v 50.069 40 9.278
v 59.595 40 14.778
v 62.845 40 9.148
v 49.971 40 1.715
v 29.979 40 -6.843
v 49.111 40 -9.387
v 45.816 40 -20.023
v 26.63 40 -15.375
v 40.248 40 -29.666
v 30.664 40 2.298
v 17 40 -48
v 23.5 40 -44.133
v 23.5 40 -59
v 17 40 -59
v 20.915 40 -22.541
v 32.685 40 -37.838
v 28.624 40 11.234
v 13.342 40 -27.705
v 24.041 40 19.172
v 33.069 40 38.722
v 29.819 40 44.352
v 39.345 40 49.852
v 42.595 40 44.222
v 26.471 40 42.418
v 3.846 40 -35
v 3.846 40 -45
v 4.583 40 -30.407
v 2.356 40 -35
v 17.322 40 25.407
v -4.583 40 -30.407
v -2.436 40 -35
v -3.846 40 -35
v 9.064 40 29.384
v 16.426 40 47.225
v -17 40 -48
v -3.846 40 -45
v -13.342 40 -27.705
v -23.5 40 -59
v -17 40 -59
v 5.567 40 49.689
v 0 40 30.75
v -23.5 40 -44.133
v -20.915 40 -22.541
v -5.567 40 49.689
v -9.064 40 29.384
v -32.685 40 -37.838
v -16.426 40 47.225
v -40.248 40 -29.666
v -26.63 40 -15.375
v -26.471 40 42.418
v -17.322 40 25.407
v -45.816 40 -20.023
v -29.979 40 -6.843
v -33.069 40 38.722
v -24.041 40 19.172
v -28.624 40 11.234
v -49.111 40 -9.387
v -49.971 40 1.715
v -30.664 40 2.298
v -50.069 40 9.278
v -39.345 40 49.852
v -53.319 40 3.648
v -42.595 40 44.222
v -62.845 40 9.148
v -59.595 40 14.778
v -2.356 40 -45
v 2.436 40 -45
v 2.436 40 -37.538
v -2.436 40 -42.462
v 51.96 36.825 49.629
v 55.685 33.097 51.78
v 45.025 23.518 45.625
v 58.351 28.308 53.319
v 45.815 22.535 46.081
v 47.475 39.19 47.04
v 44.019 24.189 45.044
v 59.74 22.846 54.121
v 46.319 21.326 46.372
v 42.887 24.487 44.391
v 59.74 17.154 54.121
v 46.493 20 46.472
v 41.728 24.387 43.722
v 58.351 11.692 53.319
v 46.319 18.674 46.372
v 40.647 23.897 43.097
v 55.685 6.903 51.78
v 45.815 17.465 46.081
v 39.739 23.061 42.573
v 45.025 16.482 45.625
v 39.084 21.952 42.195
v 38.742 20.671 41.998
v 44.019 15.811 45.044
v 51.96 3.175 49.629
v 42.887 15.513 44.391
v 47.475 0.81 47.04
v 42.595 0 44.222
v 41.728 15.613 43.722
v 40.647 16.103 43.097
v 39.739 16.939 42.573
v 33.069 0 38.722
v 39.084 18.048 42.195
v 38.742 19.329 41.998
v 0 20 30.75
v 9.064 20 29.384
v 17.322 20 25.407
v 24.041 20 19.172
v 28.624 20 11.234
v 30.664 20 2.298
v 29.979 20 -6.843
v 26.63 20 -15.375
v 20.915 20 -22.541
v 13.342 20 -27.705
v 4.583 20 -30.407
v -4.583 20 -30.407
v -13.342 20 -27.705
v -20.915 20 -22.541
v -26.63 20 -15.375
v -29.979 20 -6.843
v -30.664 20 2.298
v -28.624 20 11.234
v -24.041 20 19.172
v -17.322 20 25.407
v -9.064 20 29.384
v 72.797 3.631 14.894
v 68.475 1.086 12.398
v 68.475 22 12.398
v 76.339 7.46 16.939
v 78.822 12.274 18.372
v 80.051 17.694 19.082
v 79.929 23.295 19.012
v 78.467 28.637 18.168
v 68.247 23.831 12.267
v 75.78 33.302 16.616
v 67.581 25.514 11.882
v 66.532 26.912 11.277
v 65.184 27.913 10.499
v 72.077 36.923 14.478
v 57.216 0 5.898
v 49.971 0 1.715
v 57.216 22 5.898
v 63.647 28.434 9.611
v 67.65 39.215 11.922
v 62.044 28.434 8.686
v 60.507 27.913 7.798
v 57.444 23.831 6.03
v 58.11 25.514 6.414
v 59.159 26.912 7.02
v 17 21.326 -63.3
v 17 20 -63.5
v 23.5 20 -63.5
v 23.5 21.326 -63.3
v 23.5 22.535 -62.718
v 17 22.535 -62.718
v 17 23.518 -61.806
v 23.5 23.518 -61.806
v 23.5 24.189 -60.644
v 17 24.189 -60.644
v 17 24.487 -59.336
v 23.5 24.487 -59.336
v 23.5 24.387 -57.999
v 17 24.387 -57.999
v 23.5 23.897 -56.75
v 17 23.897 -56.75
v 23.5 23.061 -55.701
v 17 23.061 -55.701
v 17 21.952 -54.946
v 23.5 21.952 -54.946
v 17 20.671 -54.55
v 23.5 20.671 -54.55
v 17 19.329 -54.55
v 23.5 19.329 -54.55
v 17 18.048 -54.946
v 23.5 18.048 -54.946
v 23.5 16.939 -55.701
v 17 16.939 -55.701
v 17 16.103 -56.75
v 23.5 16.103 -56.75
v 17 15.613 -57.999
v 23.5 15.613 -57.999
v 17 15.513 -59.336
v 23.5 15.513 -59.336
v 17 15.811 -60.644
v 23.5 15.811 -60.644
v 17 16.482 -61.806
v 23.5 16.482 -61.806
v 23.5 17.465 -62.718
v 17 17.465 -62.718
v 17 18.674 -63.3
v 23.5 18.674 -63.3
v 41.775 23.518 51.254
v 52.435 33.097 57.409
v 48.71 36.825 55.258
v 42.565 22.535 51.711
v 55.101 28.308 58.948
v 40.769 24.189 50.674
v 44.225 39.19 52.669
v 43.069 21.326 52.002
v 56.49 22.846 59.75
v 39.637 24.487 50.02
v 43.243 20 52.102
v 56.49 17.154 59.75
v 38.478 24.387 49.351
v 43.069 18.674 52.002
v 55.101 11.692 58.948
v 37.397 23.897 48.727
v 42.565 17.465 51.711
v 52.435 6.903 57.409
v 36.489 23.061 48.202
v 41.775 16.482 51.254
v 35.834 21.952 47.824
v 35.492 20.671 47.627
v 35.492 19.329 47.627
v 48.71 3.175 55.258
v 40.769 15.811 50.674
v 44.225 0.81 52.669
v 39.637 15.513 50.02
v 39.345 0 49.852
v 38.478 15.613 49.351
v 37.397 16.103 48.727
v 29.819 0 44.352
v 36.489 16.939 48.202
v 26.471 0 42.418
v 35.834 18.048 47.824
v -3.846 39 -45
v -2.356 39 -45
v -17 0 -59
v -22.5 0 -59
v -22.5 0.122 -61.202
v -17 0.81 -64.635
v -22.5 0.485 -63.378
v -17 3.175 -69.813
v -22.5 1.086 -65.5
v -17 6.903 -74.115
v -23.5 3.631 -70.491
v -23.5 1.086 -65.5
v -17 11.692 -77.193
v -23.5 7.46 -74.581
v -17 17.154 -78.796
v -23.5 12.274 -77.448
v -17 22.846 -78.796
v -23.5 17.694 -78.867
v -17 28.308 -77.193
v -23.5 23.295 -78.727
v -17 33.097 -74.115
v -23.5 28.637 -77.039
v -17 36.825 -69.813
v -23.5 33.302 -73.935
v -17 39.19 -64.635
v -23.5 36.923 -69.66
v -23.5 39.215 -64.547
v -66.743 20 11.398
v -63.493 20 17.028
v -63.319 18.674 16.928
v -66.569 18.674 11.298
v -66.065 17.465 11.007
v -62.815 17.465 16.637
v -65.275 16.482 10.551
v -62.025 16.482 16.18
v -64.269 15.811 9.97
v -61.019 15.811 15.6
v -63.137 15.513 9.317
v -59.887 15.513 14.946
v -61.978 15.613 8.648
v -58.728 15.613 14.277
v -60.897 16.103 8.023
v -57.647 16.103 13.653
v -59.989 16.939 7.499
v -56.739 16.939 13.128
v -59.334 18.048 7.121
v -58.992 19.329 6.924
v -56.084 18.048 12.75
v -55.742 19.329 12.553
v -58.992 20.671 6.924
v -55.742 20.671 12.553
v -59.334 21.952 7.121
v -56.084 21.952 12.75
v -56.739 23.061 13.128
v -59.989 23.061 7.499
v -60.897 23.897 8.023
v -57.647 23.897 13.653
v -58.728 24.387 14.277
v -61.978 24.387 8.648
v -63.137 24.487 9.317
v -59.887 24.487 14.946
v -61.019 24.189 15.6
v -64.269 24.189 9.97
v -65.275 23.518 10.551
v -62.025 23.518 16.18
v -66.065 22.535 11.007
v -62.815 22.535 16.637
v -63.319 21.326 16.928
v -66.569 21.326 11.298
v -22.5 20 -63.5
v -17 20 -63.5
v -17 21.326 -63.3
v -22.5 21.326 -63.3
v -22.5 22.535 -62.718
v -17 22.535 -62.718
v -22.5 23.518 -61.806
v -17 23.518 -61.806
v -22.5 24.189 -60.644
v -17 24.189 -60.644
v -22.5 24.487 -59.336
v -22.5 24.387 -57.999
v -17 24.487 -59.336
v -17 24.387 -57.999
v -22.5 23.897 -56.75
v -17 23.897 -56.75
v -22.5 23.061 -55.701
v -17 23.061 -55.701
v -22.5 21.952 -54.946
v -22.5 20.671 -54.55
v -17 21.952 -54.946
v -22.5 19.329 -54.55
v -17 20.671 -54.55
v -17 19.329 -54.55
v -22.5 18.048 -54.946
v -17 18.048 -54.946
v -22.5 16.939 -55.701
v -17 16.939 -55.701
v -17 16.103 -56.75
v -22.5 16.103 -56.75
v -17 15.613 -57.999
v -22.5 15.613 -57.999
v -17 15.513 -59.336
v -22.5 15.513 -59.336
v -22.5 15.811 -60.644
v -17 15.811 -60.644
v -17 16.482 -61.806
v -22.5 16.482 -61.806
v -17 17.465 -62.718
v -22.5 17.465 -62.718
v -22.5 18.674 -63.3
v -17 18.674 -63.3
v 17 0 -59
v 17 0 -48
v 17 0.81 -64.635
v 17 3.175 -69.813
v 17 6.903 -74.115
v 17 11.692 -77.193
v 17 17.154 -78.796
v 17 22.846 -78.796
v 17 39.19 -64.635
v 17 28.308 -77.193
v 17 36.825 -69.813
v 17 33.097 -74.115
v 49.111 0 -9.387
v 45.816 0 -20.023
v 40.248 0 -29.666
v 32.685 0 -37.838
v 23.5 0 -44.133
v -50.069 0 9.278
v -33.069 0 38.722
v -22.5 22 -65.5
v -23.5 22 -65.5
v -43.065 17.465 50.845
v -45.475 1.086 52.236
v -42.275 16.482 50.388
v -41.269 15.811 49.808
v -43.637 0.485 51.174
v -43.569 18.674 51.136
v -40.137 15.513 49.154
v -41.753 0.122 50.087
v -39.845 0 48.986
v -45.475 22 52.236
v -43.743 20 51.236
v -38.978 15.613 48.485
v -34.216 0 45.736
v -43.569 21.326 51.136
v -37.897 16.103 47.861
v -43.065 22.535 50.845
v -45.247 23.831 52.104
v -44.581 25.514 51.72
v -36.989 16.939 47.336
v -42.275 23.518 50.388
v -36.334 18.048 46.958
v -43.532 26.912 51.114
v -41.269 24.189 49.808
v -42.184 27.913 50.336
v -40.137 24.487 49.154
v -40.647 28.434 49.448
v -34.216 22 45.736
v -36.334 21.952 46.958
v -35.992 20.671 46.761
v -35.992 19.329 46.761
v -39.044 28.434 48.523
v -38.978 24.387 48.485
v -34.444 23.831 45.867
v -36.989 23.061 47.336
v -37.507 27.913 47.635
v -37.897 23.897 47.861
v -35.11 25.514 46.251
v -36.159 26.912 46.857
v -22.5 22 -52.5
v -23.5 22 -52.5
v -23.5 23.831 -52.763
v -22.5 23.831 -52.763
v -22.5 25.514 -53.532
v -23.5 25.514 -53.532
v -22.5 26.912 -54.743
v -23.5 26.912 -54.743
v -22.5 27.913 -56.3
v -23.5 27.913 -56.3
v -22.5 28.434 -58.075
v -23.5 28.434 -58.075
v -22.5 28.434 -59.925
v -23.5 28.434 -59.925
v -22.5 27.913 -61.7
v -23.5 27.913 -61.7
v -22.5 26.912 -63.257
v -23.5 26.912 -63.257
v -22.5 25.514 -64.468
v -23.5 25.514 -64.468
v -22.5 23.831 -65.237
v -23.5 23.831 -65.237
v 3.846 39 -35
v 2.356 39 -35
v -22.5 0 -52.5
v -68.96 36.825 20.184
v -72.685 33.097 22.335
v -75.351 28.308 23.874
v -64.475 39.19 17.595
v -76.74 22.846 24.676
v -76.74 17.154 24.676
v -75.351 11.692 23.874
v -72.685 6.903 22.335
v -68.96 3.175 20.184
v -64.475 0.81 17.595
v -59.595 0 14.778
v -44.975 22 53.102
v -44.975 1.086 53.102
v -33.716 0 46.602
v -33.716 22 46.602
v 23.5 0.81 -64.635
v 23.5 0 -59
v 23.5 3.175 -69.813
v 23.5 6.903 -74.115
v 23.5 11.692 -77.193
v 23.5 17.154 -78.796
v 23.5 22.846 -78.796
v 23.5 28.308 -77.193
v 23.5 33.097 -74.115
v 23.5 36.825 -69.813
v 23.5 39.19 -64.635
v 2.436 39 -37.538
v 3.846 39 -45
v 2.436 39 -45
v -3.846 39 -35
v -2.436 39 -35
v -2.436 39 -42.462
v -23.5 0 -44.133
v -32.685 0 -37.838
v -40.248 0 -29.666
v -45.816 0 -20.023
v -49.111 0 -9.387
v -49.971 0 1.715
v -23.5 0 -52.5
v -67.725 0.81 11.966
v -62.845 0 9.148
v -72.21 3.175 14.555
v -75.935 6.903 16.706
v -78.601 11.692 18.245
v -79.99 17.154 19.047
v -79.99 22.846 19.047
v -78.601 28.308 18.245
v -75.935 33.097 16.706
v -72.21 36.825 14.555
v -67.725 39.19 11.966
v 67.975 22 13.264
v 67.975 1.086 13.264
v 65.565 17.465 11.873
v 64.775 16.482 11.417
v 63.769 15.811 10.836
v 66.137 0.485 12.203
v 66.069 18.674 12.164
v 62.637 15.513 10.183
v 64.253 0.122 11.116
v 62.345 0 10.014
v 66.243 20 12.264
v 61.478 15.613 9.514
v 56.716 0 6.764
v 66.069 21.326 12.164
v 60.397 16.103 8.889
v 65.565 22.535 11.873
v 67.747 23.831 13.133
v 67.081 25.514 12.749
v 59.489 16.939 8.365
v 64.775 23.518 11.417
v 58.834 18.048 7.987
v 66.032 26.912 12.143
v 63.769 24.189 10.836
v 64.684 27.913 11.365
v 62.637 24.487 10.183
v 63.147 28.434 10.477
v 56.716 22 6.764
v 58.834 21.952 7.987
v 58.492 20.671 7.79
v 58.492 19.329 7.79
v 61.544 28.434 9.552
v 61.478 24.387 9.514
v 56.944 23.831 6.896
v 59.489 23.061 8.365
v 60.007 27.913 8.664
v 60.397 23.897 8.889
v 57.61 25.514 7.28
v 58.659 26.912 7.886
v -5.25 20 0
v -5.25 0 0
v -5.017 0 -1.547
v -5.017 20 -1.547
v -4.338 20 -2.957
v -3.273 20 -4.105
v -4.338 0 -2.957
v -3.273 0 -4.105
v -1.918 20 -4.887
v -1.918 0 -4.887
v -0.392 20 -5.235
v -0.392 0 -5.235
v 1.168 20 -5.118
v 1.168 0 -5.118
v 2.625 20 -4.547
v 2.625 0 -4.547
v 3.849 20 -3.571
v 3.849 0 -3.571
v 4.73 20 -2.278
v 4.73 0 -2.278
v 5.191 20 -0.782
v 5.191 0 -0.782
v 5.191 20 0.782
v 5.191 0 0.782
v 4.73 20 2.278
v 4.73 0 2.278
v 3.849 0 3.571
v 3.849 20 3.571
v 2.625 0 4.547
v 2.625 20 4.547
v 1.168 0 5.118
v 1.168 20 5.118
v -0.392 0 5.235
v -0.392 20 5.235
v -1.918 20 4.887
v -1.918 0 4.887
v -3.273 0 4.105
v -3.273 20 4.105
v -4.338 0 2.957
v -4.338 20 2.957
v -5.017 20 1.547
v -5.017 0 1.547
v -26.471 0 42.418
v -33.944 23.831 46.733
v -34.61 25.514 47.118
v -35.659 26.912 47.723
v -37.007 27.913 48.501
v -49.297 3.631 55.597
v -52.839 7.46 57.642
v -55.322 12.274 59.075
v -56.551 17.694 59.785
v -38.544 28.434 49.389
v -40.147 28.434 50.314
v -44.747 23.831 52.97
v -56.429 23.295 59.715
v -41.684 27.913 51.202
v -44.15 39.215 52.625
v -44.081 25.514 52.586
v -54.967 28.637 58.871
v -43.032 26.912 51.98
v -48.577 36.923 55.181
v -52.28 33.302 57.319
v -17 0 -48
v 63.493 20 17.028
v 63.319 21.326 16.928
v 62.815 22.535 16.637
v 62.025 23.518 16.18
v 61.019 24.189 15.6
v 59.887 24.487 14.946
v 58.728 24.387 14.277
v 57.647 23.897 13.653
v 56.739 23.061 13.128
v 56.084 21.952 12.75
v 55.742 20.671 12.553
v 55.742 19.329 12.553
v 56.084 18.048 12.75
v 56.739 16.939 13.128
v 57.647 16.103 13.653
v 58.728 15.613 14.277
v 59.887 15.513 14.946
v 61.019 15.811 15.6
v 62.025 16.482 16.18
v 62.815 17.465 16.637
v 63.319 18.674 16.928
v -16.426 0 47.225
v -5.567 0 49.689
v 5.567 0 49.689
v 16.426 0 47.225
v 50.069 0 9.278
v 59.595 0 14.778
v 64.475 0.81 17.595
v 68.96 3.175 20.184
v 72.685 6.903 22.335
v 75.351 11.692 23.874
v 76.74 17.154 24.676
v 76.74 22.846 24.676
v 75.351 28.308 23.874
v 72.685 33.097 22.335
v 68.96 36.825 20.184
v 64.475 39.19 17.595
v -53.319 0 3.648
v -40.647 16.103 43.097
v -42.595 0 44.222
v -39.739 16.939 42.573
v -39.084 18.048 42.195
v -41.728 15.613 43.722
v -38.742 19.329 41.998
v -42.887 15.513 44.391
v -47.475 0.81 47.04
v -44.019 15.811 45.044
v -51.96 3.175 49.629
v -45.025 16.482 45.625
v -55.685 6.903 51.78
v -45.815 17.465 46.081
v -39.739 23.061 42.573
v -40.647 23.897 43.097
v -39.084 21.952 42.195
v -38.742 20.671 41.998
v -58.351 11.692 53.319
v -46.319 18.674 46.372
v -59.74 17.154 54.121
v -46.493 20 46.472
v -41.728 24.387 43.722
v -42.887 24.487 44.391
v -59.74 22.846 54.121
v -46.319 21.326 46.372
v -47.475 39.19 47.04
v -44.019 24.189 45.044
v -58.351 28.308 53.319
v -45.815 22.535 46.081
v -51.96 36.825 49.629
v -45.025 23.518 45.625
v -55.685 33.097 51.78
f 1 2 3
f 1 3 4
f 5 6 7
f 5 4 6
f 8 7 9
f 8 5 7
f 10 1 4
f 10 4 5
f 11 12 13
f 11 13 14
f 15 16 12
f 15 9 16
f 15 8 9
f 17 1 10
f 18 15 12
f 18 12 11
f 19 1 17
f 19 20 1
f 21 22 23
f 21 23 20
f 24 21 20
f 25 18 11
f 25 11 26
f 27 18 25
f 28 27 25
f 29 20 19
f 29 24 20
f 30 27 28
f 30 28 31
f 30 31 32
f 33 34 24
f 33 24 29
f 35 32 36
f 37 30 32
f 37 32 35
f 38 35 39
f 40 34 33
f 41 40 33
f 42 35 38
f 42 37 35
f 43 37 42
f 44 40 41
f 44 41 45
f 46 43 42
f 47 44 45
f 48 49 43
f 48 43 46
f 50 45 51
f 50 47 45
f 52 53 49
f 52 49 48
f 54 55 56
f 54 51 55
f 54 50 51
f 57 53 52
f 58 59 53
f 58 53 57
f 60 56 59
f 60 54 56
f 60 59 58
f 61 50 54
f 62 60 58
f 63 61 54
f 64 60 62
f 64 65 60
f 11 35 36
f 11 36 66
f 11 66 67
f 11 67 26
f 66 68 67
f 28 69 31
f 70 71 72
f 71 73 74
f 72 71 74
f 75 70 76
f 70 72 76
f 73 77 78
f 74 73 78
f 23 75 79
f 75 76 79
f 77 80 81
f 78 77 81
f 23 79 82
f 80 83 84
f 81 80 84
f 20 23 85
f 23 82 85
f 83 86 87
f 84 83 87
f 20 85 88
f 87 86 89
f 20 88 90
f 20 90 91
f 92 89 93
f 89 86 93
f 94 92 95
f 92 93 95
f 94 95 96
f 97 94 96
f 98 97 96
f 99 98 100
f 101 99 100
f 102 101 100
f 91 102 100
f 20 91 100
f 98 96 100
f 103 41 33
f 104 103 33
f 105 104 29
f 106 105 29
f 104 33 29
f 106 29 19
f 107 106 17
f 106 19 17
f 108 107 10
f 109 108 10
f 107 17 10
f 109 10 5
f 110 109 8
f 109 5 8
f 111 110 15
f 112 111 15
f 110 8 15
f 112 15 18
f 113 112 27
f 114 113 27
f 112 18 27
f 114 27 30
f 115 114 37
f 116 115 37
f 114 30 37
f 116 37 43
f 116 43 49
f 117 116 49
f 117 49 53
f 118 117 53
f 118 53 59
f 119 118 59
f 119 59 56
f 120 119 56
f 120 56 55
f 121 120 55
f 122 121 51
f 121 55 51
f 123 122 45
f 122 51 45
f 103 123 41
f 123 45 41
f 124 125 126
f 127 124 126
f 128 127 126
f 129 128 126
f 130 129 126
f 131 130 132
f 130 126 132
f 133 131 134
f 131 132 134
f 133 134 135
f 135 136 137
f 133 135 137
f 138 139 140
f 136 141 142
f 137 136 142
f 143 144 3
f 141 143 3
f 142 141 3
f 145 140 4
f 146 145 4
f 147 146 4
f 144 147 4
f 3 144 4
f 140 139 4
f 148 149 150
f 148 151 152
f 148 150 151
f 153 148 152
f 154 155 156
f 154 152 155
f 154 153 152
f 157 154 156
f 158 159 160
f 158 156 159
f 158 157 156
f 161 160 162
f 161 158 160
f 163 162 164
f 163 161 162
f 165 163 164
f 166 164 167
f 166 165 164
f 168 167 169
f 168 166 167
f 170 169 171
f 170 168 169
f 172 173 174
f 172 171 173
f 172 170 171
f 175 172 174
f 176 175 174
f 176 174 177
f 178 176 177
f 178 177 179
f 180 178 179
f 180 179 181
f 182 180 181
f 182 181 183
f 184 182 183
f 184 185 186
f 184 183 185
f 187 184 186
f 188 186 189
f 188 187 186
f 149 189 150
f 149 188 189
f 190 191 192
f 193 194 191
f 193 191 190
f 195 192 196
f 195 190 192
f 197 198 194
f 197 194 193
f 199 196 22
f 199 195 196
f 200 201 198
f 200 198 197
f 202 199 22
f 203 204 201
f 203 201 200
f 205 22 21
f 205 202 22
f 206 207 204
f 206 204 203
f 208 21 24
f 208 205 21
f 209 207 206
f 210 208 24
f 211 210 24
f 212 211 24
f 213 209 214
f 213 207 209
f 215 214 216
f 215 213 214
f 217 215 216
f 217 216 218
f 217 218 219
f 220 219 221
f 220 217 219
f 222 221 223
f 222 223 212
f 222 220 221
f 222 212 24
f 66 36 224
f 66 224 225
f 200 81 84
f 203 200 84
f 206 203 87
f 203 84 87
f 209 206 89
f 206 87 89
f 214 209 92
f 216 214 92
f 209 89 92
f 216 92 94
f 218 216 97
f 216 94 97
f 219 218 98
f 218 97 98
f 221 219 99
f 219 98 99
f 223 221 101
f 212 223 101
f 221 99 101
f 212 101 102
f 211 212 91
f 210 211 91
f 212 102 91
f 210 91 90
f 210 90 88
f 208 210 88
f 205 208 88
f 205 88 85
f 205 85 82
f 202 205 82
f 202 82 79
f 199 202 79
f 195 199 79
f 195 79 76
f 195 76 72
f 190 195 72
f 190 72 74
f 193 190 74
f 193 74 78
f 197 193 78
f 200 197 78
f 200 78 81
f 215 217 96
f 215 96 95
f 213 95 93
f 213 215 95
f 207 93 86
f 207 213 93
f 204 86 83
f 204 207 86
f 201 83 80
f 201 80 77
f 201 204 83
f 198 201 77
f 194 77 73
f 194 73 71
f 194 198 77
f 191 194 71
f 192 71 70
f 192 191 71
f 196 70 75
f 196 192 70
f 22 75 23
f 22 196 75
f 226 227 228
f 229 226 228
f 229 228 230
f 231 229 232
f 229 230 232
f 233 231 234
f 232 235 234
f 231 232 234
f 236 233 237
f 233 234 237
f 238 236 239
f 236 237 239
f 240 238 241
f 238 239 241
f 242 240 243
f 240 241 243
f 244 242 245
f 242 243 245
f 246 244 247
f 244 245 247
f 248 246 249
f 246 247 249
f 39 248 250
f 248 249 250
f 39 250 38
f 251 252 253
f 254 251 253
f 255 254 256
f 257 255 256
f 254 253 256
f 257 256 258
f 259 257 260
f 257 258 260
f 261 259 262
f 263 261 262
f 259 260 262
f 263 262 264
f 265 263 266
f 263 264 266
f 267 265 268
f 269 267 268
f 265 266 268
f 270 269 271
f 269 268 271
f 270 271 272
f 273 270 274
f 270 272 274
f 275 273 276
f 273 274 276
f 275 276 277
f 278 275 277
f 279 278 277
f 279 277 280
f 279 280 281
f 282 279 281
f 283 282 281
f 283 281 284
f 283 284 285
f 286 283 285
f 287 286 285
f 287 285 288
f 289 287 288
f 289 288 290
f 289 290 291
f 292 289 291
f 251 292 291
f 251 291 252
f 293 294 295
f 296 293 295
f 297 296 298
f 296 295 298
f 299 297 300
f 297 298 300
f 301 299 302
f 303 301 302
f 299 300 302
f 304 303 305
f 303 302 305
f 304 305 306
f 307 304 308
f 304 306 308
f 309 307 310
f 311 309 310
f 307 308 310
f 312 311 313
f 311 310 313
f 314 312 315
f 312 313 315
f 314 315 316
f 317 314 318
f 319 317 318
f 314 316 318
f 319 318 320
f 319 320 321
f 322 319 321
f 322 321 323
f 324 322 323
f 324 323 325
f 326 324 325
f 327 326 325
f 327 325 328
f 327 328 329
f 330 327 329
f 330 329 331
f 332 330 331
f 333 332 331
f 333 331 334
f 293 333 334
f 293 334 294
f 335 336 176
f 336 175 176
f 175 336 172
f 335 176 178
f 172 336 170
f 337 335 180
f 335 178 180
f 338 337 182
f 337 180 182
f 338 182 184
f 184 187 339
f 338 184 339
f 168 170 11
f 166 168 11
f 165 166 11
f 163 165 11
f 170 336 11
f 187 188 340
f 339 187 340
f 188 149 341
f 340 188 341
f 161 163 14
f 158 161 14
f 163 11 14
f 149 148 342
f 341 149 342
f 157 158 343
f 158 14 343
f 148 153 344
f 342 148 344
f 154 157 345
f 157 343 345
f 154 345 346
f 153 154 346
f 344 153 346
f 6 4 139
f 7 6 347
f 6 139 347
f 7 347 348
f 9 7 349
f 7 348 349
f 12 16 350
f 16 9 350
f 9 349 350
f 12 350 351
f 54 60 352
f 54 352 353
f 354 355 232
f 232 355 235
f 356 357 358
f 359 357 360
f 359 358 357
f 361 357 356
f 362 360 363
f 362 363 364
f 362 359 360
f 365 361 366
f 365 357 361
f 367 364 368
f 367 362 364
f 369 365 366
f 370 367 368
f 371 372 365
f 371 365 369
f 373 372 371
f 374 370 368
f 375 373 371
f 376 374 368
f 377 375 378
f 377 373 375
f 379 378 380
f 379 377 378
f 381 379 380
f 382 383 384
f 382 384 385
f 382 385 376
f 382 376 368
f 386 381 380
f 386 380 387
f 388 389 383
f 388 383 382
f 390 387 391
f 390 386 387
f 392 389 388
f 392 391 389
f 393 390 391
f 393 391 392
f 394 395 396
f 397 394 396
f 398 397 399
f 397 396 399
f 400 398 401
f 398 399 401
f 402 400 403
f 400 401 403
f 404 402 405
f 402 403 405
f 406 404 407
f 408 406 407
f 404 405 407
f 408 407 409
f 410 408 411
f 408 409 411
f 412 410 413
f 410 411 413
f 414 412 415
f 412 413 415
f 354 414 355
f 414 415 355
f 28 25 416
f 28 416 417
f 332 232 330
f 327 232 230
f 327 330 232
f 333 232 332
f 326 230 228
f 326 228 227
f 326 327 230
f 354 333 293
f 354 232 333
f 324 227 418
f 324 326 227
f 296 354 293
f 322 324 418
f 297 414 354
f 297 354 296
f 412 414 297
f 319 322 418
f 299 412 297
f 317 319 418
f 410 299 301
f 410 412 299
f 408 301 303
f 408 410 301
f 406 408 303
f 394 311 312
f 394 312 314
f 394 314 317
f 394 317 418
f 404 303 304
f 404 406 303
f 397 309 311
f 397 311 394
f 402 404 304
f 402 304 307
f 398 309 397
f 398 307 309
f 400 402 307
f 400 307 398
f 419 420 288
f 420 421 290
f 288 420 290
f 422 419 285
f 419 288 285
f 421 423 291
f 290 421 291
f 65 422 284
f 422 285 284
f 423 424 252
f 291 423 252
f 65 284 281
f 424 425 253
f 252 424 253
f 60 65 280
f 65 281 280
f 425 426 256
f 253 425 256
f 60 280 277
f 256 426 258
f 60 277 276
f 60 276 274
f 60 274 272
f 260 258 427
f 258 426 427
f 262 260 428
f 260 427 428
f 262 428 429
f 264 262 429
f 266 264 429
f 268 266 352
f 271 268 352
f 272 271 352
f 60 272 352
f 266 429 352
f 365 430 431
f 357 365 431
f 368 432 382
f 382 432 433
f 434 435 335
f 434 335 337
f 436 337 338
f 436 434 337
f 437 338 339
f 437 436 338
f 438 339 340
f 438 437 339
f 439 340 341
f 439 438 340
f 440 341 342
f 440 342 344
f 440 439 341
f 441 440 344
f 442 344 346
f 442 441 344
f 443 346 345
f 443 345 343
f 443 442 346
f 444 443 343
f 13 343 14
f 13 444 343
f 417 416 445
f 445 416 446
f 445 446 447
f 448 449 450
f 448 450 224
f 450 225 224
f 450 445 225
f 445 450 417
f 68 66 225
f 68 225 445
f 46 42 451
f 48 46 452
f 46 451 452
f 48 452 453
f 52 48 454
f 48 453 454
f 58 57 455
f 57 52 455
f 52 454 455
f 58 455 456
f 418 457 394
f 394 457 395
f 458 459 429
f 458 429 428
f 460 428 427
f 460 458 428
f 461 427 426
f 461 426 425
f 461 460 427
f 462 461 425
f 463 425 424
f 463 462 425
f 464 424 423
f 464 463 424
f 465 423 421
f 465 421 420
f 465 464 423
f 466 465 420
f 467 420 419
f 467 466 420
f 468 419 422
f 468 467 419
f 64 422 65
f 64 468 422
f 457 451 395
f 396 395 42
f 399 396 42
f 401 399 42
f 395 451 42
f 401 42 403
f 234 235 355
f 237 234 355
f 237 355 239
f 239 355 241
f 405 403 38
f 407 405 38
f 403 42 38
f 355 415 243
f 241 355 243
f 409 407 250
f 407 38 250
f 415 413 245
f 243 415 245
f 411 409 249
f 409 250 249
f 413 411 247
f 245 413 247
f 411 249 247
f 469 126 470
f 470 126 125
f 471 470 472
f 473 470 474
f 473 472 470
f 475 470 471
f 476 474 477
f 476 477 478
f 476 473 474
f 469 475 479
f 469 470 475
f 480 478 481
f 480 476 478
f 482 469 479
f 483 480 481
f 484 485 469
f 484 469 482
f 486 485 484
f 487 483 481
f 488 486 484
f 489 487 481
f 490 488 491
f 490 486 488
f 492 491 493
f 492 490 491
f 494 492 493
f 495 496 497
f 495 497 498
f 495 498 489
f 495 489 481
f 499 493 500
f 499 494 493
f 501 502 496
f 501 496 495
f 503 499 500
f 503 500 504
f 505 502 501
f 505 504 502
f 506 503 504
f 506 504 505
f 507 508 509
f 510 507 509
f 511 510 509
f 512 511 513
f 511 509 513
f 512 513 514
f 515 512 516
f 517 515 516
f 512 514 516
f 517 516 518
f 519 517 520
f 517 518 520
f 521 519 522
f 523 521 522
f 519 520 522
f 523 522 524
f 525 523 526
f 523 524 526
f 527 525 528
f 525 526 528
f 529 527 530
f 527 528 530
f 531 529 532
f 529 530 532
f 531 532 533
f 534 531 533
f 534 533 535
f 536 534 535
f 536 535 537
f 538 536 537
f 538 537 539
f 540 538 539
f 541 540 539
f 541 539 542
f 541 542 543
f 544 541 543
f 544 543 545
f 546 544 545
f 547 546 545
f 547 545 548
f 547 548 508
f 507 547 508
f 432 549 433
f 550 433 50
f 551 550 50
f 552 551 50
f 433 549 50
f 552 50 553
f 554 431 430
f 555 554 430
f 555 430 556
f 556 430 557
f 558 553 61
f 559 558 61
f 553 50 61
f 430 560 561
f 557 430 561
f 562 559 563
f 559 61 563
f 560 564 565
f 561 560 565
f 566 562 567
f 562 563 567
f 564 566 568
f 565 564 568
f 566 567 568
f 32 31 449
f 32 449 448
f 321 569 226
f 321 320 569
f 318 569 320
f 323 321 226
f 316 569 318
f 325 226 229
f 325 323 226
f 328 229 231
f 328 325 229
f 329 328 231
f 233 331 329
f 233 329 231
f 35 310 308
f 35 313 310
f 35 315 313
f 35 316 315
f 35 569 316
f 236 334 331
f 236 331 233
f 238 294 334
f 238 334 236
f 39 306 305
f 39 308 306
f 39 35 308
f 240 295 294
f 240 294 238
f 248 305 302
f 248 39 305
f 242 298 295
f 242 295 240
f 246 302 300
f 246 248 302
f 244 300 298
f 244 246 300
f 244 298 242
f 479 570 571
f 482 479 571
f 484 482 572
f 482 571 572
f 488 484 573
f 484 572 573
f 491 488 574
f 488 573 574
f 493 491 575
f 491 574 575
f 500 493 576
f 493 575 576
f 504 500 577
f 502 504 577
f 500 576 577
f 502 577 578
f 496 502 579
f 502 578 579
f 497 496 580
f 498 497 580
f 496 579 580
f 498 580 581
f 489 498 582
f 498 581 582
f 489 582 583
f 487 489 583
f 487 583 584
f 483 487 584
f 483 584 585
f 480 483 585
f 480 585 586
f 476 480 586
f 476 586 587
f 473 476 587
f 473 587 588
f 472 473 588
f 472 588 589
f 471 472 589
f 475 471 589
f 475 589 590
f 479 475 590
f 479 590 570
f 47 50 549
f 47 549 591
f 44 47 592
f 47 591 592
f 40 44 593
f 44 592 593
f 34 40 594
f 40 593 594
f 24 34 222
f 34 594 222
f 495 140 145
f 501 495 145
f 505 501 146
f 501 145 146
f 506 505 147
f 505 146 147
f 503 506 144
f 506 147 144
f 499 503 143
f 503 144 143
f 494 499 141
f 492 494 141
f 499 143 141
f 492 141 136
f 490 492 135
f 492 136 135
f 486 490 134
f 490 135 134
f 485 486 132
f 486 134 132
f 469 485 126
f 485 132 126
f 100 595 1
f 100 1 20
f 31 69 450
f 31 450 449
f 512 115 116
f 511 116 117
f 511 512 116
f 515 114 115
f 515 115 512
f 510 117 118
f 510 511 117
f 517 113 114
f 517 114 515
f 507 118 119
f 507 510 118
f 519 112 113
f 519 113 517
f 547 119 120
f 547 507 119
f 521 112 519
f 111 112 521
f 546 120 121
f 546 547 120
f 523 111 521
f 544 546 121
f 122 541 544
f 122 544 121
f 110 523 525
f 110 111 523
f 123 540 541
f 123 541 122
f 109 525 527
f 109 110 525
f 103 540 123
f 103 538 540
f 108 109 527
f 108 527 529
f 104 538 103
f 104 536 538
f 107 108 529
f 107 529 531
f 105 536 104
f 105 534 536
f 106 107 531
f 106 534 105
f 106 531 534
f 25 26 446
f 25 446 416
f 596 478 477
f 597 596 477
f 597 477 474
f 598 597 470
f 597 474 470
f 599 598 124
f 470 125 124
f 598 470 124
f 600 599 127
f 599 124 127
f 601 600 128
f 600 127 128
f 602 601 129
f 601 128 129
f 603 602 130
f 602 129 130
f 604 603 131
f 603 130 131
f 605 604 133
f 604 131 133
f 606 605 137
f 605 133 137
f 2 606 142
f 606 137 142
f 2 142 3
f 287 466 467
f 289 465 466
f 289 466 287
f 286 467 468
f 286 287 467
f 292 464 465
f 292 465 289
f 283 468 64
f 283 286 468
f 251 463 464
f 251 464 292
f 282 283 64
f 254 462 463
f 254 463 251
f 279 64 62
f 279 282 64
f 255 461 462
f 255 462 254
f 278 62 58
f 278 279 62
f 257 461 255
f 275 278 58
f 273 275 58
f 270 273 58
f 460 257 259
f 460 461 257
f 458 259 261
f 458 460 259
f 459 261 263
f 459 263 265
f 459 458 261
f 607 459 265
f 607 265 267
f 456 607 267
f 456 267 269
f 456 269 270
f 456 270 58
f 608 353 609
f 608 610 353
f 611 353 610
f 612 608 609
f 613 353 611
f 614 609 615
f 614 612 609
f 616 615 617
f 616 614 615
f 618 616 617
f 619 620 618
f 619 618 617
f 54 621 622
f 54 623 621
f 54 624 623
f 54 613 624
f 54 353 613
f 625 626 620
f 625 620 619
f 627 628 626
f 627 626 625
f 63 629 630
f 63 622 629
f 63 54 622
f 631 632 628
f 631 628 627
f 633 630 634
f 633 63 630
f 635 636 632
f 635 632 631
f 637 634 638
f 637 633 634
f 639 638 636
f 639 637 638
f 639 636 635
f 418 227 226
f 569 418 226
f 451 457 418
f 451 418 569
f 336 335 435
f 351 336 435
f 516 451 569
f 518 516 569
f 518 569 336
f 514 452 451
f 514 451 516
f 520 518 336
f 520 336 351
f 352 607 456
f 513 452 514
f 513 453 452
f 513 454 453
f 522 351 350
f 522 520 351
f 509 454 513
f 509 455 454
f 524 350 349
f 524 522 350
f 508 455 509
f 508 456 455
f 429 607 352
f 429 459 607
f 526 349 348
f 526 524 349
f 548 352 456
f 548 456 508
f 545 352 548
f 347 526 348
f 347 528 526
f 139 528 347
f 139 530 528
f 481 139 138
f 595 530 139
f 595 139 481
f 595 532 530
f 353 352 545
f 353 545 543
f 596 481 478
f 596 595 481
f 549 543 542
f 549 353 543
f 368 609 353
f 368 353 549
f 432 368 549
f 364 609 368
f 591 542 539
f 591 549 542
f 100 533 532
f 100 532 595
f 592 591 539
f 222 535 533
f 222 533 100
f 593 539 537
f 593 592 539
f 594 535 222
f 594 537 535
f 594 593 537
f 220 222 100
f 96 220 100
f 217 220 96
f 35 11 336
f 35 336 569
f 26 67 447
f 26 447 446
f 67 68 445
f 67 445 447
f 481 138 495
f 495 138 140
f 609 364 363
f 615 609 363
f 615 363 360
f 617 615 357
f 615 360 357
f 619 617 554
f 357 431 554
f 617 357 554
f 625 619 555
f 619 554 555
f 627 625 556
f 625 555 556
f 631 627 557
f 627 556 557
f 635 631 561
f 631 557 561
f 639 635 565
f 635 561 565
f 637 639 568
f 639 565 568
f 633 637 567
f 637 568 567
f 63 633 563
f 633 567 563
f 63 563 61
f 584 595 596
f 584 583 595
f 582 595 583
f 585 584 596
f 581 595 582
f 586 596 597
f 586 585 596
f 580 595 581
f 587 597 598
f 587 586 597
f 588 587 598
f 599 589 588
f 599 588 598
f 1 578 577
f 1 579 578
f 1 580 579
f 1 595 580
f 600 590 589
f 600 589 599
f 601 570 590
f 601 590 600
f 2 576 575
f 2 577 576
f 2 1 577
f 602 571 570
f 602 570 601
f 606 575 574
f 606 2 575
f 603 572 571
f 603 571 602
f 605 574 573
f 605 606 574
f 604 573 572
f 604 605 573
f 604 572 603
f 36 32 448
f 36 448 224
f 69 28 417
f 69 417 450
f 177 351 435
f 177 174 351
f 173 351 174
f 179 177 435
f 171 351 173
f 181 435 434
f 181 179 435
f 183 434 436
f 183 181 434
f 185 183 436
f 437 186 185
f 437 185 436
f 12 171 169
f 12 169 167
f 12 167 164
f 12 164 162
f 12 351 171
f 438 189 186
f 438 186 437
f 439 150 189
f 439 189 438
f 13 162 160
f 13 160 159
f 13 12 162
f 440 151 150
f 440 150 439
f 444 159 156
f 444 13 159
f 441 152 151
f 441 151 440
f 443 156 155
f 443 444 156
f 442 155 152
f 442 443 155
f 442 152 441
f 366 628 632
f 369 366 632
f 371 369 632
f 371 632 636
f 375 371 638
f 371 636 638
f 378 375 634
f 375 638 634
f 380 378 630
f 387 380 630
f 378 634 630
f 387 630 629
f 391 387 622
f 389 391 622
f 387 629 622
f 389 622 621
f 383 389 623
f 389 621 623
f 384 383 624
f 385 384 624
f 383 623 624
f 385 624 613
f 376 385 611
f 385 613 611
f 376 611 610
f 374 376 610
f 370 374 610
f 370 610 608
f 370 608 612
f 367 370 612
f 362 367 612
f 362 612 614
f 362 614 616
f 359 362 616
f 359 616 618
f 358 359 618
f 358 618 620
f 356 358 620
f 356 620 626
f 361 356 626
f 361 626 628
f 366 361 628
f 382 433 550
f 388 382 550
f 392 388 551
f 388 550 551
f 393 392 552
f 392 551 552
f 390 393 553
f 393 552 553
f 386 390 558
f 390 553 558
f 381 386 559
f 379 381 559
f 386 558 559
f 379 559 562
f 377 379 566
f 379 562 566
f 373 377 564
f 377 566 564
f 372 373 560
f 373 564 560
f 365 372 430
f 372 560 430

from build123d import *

# Parameters (mm, degrees)
SKETCH1_R                    = 50
BOSS_EXTRUDE1_DEPTH          = 40
SKETCH2_R                    = 30.75
CUT_EXTRUDE1_DEPTH           = 20
F_10_5_10_5_DIAMETER_HOLE1_D = 10.5
CUT_EXTRUDE2_DEPTH           = 82.240384046
BOSS_EXTRUDE2_START          = -3.866679
SKETCH6_W                    = 47
SKETCH6_H                    = 40
BOSS_EXTRUDE2_DEPTH          = 3.866679
BOSS_EXTRUDE3_DEPTH          = 6.5
F_9_0_9_DIAMETER_HOLE1_D     = 9
CUT_EXTRUDE3_DEPTH           = 1
CIRPATTERN1_COUNT            = 3
CIRPATTERN1_COPY_1_DEPTH     = 6.5
CIRPATTERN1_COPY_2_DEPTH     = 6.5
CIRPATTERN1_COPY_3_D         = 9
CIRPATTERN1_COPY_4_D         = 9
CUT_EXTRUDE4_DEPTH           = 1


with BuildPart() as part:
    # Sketch1 → Boss-Extrude1 (new body)
    with BuildSketch(Plane(origin=(0, 0, 0), x_dir=(1, 0, 0), z_dir=(0, 1, 0))):
        with Locations(Location((0, 0, 0), (0, 0, 270))):
            Circle(SKETCH1_R)
    extrude(amount=BOSS_EXTRUDE1_DEPTH)

    # Sketch2 → Cut-Extrude1 (cut)
    with BuildSketch(Plane(origin=(0, 40, 0), x_dir=(1, 0, 0), z_dir=(0, 1, 0))):
        with Locations(Location((0, 0, 0), (0, 0, 270))):
            Circle(SKETCH2_R)
    extrude(amount=-CUT_EXTRUDE1_DEPTH, mode=Mode.SUBTRACT)

    # Ø10.5 (10.5) Diameter Hole1 (through all)
    with Locations(Plane(origin=(0, 20, 0), x_dir=(1, 0, 0), z_dir=(0, 1, 0))):
        with Locations((0, 0)):
            Hole(F_10_5_10_5_DIAMETER_HOLE1_D / 2)

    # Sketch5 → Cut-Extrude2 (cut, through all)
    with BuildSketch(Plane(origin=(0, 40, 0), x_dir=(1, 0, 0), z_dir=(0, 1, 0))):
        with BuildLine():
            Line((-14, 48), (14, 48))
            ThreePointArc((14, 48), (0, 50), (-14, 48))
        make_face()
    cut_extrude2 = extrude(amount=-CUT_EXTRUDE2_DEPTH, mode=Mode.SUBTRACT)

    # Sketch6 → Boss-Extrude2 (add)
    with BuildSketch(Plane(origin=(0, 0, -48), x_dir=(-1, 0, 0), z_dir=(0, 0, -1)).offset(BOSS_EXTRUDE2_START)):
        with Locations((0, 20)):
            Rectangle(SKETCH6_W, SKETCH6_H)
    boss_extrude2 = extrude(amount=BOSS_EXTRUDE2_DEPTH)

    # Sketch7 → Boss-Extrude3 (add)
    with BuildSketch(Plane.ZY.offset(23.5)):
        with BuildLine():
            Line((-59, 40), (-48, 40))
            Line((-48, 40), (-48, 0))
            Line((-48, 0), (-59, 0))
            ThreePointArc((-59, 0), (-79, 20), (-59, 40))
        make_face()
    boss_extrude3 = extrude(amount=-BOSS_EXTRUDE3_DEPTH)

    # Ø9.0 (9) Diameter Hole1 (through all)
    with Locations(Plane.ZY.offset(23.5)):
        with Locations((-59, 20)):
            f_9_0_9_diameter_hole1 = Hole(F_9_0_9_DIAMETER_HOLE1_D / 2)

    # Mirror1: Boss-Extrude3, Ø9.0 (9) Diameter Hole1 across plane
    add(boss_extrude3.mirror(Plane(origin=(0, 0, 0), x_dir=(0, 0, 1), z_dir=(1, 0, 0))))
    add(f_9_0_9_diameter_hole1.mirror(Plane(origin=(0, 0, 0), x_dir=(0, 0, 1), z_dir=(1, 0, 0))), mode=Mode.SUBTRACT)

    # Sketch10 → Cut-Extrude3 (cut)
    with BuildSketch(Plane.ZY.offset(23.5)):
        with BuildLine():
            Line((-65.5, 22), (-65.5, 0))
            Line((-65.5, 0), (-52.5, 0))
            Line((-52.5, 0), (-52.5, 22))
            ThreePointArc((-52.5, 22), (-59, 28.5), (-65.5, 22))
        make_face()
    cut_extrude3 = extrude(amount=-CUT_EXTRUDE3_DEPTH, mode=Mode.SUBTRACT)

    # CirPattern1: Cut-Extrude2, Boss-Extrude2, Boss-Extrude3, Ø9.0 (9) Diameter Hole1, Cut-Extrude3 ×3 about axis
    cirpattern1_axis = Axis((0, 0, 0), (0, 1, 0))
    add([cut_extrude2.rotate(cirpattern1_axis, i * 360 / CIRPATTERN1_COUNT) for i in range(1, CIRPATTERN1_COUNT)], mode=Mode.SUBTRACT)
    add([boss_extrude2.rotate(cirpattern1_axis, i * 360 / CIRPATTERN1_COUNT) for i in range(1, CIRPATTERN1_COUNT)])
    add([boss_extrude3.rotate(cirpattern1_axis, i * 360 / CIRPATTERN1_COUNT) for i in range(1, CIRPATTERN1_COUNT)])
    add([f_9_0_9_diameter_hole1.rotate(cirpattern1_axis, i * 360 / CIRPATTERN1_COUNT) for i in range(1, CIRPATTERN1_COUNT)], mode=Mode.SUBTRACT)
    add([cut_extrude3.rotate(cirpattern1_axis, i * 360 / CIRPATTERN1_COUNT) for i in range(1, CIRPATTERN1_COUNT)], mode=Mode.SUBTRACT)

    # CirPattern1 copy 1 sketch → CirPattern1 copy 1 (add)
    with BuildSketch(Plane(origin=(-11.75, 0, -20.351596989), x_dir=(0.8660254037844387, 0, -0.4999999999999998), z_dir=(-0.4999999999999998, 0, -0.8660254037844387))):
        with BuildLine():
            Line((-59, -40), (-48, -40))
            Line((-48, -40), (-48, 0))
            Line((-48, 0), (-59, 0))
            ThreePointArc((-59, 0), (-79, -20), (-59, -40))
        make_face()
    extrude(amount=-CIRPATTERN1_COPY_1_DEPTH)

    # CirPattern1 copy 2 sketch → CirPattern1 copy 2 (add)
    with BuildSketch(Plane(origin=(-11.75, 0, 20.351596989), x_dir=(-0.8660254037844384, 0, -0.5000000000000004), z_dir=(-0.5000000000000004, 0, 0.8660254037844384))):
        with BuildLine():
            Line((-59, -40), (-48, -40))
            Line((-48, -40), (-48, 0))
            Line((-48, 0), (-59, 0))
            ThreePointArc((-59, 0), (-79, -20), (-59, -40))
        make_face()
    extrude(amount=-CIRPATTERN1_COPY_2_DEPTH)

    # CirPattern1 copy 3 (through all)
    with Locations(Plane(origin=(-11.75, 0, -20.351596989), x_dir=(0.8660254037844387, 0, -0.4999999999999998), z_dir=(-0.4999999999999998, 0, -0.8660254037844387))):
        with Locations((-59, -20)):
            Hole(CIRPATTERN1_COPY_3_D / 2)

    # CirPattern1 copy 4 (through all)
    with Locations(Plane(origin=(-11.75, 0, 20.351596989), x_dir=(-0.8660254037844384, 0, -0.5000000000000004), z_dir=(-0.5000000000000004, 0, 0.8660254037844384))):
        with Locations((-59, -20)):
            Hole(CIRPATTERN1_COPY_4_D / 2)

    # Sketch11 → Cut-Extrude4 (cut)
    with BuildSketch(Plane(origin=(0, 40, 0), x_dir=(1, 0, 0), z_dir=(0, 1, 0))):
        Polygon((-3.846153846, 35), (-3.846153846, 45), (-2.355769231, 45), (2.435897436, 37.538060897), (2.435897436, 45), (3.846153846, 45), (3.846153846, 35), (2.355769231, 35), (-2.435897436, 42.461939103), (-2.435897436, 35), align=None)
    extrude(amount=-CUT_EXTRUDE4_DEPTH, mode=Mode.SUBTRACT)


solid = part.part
